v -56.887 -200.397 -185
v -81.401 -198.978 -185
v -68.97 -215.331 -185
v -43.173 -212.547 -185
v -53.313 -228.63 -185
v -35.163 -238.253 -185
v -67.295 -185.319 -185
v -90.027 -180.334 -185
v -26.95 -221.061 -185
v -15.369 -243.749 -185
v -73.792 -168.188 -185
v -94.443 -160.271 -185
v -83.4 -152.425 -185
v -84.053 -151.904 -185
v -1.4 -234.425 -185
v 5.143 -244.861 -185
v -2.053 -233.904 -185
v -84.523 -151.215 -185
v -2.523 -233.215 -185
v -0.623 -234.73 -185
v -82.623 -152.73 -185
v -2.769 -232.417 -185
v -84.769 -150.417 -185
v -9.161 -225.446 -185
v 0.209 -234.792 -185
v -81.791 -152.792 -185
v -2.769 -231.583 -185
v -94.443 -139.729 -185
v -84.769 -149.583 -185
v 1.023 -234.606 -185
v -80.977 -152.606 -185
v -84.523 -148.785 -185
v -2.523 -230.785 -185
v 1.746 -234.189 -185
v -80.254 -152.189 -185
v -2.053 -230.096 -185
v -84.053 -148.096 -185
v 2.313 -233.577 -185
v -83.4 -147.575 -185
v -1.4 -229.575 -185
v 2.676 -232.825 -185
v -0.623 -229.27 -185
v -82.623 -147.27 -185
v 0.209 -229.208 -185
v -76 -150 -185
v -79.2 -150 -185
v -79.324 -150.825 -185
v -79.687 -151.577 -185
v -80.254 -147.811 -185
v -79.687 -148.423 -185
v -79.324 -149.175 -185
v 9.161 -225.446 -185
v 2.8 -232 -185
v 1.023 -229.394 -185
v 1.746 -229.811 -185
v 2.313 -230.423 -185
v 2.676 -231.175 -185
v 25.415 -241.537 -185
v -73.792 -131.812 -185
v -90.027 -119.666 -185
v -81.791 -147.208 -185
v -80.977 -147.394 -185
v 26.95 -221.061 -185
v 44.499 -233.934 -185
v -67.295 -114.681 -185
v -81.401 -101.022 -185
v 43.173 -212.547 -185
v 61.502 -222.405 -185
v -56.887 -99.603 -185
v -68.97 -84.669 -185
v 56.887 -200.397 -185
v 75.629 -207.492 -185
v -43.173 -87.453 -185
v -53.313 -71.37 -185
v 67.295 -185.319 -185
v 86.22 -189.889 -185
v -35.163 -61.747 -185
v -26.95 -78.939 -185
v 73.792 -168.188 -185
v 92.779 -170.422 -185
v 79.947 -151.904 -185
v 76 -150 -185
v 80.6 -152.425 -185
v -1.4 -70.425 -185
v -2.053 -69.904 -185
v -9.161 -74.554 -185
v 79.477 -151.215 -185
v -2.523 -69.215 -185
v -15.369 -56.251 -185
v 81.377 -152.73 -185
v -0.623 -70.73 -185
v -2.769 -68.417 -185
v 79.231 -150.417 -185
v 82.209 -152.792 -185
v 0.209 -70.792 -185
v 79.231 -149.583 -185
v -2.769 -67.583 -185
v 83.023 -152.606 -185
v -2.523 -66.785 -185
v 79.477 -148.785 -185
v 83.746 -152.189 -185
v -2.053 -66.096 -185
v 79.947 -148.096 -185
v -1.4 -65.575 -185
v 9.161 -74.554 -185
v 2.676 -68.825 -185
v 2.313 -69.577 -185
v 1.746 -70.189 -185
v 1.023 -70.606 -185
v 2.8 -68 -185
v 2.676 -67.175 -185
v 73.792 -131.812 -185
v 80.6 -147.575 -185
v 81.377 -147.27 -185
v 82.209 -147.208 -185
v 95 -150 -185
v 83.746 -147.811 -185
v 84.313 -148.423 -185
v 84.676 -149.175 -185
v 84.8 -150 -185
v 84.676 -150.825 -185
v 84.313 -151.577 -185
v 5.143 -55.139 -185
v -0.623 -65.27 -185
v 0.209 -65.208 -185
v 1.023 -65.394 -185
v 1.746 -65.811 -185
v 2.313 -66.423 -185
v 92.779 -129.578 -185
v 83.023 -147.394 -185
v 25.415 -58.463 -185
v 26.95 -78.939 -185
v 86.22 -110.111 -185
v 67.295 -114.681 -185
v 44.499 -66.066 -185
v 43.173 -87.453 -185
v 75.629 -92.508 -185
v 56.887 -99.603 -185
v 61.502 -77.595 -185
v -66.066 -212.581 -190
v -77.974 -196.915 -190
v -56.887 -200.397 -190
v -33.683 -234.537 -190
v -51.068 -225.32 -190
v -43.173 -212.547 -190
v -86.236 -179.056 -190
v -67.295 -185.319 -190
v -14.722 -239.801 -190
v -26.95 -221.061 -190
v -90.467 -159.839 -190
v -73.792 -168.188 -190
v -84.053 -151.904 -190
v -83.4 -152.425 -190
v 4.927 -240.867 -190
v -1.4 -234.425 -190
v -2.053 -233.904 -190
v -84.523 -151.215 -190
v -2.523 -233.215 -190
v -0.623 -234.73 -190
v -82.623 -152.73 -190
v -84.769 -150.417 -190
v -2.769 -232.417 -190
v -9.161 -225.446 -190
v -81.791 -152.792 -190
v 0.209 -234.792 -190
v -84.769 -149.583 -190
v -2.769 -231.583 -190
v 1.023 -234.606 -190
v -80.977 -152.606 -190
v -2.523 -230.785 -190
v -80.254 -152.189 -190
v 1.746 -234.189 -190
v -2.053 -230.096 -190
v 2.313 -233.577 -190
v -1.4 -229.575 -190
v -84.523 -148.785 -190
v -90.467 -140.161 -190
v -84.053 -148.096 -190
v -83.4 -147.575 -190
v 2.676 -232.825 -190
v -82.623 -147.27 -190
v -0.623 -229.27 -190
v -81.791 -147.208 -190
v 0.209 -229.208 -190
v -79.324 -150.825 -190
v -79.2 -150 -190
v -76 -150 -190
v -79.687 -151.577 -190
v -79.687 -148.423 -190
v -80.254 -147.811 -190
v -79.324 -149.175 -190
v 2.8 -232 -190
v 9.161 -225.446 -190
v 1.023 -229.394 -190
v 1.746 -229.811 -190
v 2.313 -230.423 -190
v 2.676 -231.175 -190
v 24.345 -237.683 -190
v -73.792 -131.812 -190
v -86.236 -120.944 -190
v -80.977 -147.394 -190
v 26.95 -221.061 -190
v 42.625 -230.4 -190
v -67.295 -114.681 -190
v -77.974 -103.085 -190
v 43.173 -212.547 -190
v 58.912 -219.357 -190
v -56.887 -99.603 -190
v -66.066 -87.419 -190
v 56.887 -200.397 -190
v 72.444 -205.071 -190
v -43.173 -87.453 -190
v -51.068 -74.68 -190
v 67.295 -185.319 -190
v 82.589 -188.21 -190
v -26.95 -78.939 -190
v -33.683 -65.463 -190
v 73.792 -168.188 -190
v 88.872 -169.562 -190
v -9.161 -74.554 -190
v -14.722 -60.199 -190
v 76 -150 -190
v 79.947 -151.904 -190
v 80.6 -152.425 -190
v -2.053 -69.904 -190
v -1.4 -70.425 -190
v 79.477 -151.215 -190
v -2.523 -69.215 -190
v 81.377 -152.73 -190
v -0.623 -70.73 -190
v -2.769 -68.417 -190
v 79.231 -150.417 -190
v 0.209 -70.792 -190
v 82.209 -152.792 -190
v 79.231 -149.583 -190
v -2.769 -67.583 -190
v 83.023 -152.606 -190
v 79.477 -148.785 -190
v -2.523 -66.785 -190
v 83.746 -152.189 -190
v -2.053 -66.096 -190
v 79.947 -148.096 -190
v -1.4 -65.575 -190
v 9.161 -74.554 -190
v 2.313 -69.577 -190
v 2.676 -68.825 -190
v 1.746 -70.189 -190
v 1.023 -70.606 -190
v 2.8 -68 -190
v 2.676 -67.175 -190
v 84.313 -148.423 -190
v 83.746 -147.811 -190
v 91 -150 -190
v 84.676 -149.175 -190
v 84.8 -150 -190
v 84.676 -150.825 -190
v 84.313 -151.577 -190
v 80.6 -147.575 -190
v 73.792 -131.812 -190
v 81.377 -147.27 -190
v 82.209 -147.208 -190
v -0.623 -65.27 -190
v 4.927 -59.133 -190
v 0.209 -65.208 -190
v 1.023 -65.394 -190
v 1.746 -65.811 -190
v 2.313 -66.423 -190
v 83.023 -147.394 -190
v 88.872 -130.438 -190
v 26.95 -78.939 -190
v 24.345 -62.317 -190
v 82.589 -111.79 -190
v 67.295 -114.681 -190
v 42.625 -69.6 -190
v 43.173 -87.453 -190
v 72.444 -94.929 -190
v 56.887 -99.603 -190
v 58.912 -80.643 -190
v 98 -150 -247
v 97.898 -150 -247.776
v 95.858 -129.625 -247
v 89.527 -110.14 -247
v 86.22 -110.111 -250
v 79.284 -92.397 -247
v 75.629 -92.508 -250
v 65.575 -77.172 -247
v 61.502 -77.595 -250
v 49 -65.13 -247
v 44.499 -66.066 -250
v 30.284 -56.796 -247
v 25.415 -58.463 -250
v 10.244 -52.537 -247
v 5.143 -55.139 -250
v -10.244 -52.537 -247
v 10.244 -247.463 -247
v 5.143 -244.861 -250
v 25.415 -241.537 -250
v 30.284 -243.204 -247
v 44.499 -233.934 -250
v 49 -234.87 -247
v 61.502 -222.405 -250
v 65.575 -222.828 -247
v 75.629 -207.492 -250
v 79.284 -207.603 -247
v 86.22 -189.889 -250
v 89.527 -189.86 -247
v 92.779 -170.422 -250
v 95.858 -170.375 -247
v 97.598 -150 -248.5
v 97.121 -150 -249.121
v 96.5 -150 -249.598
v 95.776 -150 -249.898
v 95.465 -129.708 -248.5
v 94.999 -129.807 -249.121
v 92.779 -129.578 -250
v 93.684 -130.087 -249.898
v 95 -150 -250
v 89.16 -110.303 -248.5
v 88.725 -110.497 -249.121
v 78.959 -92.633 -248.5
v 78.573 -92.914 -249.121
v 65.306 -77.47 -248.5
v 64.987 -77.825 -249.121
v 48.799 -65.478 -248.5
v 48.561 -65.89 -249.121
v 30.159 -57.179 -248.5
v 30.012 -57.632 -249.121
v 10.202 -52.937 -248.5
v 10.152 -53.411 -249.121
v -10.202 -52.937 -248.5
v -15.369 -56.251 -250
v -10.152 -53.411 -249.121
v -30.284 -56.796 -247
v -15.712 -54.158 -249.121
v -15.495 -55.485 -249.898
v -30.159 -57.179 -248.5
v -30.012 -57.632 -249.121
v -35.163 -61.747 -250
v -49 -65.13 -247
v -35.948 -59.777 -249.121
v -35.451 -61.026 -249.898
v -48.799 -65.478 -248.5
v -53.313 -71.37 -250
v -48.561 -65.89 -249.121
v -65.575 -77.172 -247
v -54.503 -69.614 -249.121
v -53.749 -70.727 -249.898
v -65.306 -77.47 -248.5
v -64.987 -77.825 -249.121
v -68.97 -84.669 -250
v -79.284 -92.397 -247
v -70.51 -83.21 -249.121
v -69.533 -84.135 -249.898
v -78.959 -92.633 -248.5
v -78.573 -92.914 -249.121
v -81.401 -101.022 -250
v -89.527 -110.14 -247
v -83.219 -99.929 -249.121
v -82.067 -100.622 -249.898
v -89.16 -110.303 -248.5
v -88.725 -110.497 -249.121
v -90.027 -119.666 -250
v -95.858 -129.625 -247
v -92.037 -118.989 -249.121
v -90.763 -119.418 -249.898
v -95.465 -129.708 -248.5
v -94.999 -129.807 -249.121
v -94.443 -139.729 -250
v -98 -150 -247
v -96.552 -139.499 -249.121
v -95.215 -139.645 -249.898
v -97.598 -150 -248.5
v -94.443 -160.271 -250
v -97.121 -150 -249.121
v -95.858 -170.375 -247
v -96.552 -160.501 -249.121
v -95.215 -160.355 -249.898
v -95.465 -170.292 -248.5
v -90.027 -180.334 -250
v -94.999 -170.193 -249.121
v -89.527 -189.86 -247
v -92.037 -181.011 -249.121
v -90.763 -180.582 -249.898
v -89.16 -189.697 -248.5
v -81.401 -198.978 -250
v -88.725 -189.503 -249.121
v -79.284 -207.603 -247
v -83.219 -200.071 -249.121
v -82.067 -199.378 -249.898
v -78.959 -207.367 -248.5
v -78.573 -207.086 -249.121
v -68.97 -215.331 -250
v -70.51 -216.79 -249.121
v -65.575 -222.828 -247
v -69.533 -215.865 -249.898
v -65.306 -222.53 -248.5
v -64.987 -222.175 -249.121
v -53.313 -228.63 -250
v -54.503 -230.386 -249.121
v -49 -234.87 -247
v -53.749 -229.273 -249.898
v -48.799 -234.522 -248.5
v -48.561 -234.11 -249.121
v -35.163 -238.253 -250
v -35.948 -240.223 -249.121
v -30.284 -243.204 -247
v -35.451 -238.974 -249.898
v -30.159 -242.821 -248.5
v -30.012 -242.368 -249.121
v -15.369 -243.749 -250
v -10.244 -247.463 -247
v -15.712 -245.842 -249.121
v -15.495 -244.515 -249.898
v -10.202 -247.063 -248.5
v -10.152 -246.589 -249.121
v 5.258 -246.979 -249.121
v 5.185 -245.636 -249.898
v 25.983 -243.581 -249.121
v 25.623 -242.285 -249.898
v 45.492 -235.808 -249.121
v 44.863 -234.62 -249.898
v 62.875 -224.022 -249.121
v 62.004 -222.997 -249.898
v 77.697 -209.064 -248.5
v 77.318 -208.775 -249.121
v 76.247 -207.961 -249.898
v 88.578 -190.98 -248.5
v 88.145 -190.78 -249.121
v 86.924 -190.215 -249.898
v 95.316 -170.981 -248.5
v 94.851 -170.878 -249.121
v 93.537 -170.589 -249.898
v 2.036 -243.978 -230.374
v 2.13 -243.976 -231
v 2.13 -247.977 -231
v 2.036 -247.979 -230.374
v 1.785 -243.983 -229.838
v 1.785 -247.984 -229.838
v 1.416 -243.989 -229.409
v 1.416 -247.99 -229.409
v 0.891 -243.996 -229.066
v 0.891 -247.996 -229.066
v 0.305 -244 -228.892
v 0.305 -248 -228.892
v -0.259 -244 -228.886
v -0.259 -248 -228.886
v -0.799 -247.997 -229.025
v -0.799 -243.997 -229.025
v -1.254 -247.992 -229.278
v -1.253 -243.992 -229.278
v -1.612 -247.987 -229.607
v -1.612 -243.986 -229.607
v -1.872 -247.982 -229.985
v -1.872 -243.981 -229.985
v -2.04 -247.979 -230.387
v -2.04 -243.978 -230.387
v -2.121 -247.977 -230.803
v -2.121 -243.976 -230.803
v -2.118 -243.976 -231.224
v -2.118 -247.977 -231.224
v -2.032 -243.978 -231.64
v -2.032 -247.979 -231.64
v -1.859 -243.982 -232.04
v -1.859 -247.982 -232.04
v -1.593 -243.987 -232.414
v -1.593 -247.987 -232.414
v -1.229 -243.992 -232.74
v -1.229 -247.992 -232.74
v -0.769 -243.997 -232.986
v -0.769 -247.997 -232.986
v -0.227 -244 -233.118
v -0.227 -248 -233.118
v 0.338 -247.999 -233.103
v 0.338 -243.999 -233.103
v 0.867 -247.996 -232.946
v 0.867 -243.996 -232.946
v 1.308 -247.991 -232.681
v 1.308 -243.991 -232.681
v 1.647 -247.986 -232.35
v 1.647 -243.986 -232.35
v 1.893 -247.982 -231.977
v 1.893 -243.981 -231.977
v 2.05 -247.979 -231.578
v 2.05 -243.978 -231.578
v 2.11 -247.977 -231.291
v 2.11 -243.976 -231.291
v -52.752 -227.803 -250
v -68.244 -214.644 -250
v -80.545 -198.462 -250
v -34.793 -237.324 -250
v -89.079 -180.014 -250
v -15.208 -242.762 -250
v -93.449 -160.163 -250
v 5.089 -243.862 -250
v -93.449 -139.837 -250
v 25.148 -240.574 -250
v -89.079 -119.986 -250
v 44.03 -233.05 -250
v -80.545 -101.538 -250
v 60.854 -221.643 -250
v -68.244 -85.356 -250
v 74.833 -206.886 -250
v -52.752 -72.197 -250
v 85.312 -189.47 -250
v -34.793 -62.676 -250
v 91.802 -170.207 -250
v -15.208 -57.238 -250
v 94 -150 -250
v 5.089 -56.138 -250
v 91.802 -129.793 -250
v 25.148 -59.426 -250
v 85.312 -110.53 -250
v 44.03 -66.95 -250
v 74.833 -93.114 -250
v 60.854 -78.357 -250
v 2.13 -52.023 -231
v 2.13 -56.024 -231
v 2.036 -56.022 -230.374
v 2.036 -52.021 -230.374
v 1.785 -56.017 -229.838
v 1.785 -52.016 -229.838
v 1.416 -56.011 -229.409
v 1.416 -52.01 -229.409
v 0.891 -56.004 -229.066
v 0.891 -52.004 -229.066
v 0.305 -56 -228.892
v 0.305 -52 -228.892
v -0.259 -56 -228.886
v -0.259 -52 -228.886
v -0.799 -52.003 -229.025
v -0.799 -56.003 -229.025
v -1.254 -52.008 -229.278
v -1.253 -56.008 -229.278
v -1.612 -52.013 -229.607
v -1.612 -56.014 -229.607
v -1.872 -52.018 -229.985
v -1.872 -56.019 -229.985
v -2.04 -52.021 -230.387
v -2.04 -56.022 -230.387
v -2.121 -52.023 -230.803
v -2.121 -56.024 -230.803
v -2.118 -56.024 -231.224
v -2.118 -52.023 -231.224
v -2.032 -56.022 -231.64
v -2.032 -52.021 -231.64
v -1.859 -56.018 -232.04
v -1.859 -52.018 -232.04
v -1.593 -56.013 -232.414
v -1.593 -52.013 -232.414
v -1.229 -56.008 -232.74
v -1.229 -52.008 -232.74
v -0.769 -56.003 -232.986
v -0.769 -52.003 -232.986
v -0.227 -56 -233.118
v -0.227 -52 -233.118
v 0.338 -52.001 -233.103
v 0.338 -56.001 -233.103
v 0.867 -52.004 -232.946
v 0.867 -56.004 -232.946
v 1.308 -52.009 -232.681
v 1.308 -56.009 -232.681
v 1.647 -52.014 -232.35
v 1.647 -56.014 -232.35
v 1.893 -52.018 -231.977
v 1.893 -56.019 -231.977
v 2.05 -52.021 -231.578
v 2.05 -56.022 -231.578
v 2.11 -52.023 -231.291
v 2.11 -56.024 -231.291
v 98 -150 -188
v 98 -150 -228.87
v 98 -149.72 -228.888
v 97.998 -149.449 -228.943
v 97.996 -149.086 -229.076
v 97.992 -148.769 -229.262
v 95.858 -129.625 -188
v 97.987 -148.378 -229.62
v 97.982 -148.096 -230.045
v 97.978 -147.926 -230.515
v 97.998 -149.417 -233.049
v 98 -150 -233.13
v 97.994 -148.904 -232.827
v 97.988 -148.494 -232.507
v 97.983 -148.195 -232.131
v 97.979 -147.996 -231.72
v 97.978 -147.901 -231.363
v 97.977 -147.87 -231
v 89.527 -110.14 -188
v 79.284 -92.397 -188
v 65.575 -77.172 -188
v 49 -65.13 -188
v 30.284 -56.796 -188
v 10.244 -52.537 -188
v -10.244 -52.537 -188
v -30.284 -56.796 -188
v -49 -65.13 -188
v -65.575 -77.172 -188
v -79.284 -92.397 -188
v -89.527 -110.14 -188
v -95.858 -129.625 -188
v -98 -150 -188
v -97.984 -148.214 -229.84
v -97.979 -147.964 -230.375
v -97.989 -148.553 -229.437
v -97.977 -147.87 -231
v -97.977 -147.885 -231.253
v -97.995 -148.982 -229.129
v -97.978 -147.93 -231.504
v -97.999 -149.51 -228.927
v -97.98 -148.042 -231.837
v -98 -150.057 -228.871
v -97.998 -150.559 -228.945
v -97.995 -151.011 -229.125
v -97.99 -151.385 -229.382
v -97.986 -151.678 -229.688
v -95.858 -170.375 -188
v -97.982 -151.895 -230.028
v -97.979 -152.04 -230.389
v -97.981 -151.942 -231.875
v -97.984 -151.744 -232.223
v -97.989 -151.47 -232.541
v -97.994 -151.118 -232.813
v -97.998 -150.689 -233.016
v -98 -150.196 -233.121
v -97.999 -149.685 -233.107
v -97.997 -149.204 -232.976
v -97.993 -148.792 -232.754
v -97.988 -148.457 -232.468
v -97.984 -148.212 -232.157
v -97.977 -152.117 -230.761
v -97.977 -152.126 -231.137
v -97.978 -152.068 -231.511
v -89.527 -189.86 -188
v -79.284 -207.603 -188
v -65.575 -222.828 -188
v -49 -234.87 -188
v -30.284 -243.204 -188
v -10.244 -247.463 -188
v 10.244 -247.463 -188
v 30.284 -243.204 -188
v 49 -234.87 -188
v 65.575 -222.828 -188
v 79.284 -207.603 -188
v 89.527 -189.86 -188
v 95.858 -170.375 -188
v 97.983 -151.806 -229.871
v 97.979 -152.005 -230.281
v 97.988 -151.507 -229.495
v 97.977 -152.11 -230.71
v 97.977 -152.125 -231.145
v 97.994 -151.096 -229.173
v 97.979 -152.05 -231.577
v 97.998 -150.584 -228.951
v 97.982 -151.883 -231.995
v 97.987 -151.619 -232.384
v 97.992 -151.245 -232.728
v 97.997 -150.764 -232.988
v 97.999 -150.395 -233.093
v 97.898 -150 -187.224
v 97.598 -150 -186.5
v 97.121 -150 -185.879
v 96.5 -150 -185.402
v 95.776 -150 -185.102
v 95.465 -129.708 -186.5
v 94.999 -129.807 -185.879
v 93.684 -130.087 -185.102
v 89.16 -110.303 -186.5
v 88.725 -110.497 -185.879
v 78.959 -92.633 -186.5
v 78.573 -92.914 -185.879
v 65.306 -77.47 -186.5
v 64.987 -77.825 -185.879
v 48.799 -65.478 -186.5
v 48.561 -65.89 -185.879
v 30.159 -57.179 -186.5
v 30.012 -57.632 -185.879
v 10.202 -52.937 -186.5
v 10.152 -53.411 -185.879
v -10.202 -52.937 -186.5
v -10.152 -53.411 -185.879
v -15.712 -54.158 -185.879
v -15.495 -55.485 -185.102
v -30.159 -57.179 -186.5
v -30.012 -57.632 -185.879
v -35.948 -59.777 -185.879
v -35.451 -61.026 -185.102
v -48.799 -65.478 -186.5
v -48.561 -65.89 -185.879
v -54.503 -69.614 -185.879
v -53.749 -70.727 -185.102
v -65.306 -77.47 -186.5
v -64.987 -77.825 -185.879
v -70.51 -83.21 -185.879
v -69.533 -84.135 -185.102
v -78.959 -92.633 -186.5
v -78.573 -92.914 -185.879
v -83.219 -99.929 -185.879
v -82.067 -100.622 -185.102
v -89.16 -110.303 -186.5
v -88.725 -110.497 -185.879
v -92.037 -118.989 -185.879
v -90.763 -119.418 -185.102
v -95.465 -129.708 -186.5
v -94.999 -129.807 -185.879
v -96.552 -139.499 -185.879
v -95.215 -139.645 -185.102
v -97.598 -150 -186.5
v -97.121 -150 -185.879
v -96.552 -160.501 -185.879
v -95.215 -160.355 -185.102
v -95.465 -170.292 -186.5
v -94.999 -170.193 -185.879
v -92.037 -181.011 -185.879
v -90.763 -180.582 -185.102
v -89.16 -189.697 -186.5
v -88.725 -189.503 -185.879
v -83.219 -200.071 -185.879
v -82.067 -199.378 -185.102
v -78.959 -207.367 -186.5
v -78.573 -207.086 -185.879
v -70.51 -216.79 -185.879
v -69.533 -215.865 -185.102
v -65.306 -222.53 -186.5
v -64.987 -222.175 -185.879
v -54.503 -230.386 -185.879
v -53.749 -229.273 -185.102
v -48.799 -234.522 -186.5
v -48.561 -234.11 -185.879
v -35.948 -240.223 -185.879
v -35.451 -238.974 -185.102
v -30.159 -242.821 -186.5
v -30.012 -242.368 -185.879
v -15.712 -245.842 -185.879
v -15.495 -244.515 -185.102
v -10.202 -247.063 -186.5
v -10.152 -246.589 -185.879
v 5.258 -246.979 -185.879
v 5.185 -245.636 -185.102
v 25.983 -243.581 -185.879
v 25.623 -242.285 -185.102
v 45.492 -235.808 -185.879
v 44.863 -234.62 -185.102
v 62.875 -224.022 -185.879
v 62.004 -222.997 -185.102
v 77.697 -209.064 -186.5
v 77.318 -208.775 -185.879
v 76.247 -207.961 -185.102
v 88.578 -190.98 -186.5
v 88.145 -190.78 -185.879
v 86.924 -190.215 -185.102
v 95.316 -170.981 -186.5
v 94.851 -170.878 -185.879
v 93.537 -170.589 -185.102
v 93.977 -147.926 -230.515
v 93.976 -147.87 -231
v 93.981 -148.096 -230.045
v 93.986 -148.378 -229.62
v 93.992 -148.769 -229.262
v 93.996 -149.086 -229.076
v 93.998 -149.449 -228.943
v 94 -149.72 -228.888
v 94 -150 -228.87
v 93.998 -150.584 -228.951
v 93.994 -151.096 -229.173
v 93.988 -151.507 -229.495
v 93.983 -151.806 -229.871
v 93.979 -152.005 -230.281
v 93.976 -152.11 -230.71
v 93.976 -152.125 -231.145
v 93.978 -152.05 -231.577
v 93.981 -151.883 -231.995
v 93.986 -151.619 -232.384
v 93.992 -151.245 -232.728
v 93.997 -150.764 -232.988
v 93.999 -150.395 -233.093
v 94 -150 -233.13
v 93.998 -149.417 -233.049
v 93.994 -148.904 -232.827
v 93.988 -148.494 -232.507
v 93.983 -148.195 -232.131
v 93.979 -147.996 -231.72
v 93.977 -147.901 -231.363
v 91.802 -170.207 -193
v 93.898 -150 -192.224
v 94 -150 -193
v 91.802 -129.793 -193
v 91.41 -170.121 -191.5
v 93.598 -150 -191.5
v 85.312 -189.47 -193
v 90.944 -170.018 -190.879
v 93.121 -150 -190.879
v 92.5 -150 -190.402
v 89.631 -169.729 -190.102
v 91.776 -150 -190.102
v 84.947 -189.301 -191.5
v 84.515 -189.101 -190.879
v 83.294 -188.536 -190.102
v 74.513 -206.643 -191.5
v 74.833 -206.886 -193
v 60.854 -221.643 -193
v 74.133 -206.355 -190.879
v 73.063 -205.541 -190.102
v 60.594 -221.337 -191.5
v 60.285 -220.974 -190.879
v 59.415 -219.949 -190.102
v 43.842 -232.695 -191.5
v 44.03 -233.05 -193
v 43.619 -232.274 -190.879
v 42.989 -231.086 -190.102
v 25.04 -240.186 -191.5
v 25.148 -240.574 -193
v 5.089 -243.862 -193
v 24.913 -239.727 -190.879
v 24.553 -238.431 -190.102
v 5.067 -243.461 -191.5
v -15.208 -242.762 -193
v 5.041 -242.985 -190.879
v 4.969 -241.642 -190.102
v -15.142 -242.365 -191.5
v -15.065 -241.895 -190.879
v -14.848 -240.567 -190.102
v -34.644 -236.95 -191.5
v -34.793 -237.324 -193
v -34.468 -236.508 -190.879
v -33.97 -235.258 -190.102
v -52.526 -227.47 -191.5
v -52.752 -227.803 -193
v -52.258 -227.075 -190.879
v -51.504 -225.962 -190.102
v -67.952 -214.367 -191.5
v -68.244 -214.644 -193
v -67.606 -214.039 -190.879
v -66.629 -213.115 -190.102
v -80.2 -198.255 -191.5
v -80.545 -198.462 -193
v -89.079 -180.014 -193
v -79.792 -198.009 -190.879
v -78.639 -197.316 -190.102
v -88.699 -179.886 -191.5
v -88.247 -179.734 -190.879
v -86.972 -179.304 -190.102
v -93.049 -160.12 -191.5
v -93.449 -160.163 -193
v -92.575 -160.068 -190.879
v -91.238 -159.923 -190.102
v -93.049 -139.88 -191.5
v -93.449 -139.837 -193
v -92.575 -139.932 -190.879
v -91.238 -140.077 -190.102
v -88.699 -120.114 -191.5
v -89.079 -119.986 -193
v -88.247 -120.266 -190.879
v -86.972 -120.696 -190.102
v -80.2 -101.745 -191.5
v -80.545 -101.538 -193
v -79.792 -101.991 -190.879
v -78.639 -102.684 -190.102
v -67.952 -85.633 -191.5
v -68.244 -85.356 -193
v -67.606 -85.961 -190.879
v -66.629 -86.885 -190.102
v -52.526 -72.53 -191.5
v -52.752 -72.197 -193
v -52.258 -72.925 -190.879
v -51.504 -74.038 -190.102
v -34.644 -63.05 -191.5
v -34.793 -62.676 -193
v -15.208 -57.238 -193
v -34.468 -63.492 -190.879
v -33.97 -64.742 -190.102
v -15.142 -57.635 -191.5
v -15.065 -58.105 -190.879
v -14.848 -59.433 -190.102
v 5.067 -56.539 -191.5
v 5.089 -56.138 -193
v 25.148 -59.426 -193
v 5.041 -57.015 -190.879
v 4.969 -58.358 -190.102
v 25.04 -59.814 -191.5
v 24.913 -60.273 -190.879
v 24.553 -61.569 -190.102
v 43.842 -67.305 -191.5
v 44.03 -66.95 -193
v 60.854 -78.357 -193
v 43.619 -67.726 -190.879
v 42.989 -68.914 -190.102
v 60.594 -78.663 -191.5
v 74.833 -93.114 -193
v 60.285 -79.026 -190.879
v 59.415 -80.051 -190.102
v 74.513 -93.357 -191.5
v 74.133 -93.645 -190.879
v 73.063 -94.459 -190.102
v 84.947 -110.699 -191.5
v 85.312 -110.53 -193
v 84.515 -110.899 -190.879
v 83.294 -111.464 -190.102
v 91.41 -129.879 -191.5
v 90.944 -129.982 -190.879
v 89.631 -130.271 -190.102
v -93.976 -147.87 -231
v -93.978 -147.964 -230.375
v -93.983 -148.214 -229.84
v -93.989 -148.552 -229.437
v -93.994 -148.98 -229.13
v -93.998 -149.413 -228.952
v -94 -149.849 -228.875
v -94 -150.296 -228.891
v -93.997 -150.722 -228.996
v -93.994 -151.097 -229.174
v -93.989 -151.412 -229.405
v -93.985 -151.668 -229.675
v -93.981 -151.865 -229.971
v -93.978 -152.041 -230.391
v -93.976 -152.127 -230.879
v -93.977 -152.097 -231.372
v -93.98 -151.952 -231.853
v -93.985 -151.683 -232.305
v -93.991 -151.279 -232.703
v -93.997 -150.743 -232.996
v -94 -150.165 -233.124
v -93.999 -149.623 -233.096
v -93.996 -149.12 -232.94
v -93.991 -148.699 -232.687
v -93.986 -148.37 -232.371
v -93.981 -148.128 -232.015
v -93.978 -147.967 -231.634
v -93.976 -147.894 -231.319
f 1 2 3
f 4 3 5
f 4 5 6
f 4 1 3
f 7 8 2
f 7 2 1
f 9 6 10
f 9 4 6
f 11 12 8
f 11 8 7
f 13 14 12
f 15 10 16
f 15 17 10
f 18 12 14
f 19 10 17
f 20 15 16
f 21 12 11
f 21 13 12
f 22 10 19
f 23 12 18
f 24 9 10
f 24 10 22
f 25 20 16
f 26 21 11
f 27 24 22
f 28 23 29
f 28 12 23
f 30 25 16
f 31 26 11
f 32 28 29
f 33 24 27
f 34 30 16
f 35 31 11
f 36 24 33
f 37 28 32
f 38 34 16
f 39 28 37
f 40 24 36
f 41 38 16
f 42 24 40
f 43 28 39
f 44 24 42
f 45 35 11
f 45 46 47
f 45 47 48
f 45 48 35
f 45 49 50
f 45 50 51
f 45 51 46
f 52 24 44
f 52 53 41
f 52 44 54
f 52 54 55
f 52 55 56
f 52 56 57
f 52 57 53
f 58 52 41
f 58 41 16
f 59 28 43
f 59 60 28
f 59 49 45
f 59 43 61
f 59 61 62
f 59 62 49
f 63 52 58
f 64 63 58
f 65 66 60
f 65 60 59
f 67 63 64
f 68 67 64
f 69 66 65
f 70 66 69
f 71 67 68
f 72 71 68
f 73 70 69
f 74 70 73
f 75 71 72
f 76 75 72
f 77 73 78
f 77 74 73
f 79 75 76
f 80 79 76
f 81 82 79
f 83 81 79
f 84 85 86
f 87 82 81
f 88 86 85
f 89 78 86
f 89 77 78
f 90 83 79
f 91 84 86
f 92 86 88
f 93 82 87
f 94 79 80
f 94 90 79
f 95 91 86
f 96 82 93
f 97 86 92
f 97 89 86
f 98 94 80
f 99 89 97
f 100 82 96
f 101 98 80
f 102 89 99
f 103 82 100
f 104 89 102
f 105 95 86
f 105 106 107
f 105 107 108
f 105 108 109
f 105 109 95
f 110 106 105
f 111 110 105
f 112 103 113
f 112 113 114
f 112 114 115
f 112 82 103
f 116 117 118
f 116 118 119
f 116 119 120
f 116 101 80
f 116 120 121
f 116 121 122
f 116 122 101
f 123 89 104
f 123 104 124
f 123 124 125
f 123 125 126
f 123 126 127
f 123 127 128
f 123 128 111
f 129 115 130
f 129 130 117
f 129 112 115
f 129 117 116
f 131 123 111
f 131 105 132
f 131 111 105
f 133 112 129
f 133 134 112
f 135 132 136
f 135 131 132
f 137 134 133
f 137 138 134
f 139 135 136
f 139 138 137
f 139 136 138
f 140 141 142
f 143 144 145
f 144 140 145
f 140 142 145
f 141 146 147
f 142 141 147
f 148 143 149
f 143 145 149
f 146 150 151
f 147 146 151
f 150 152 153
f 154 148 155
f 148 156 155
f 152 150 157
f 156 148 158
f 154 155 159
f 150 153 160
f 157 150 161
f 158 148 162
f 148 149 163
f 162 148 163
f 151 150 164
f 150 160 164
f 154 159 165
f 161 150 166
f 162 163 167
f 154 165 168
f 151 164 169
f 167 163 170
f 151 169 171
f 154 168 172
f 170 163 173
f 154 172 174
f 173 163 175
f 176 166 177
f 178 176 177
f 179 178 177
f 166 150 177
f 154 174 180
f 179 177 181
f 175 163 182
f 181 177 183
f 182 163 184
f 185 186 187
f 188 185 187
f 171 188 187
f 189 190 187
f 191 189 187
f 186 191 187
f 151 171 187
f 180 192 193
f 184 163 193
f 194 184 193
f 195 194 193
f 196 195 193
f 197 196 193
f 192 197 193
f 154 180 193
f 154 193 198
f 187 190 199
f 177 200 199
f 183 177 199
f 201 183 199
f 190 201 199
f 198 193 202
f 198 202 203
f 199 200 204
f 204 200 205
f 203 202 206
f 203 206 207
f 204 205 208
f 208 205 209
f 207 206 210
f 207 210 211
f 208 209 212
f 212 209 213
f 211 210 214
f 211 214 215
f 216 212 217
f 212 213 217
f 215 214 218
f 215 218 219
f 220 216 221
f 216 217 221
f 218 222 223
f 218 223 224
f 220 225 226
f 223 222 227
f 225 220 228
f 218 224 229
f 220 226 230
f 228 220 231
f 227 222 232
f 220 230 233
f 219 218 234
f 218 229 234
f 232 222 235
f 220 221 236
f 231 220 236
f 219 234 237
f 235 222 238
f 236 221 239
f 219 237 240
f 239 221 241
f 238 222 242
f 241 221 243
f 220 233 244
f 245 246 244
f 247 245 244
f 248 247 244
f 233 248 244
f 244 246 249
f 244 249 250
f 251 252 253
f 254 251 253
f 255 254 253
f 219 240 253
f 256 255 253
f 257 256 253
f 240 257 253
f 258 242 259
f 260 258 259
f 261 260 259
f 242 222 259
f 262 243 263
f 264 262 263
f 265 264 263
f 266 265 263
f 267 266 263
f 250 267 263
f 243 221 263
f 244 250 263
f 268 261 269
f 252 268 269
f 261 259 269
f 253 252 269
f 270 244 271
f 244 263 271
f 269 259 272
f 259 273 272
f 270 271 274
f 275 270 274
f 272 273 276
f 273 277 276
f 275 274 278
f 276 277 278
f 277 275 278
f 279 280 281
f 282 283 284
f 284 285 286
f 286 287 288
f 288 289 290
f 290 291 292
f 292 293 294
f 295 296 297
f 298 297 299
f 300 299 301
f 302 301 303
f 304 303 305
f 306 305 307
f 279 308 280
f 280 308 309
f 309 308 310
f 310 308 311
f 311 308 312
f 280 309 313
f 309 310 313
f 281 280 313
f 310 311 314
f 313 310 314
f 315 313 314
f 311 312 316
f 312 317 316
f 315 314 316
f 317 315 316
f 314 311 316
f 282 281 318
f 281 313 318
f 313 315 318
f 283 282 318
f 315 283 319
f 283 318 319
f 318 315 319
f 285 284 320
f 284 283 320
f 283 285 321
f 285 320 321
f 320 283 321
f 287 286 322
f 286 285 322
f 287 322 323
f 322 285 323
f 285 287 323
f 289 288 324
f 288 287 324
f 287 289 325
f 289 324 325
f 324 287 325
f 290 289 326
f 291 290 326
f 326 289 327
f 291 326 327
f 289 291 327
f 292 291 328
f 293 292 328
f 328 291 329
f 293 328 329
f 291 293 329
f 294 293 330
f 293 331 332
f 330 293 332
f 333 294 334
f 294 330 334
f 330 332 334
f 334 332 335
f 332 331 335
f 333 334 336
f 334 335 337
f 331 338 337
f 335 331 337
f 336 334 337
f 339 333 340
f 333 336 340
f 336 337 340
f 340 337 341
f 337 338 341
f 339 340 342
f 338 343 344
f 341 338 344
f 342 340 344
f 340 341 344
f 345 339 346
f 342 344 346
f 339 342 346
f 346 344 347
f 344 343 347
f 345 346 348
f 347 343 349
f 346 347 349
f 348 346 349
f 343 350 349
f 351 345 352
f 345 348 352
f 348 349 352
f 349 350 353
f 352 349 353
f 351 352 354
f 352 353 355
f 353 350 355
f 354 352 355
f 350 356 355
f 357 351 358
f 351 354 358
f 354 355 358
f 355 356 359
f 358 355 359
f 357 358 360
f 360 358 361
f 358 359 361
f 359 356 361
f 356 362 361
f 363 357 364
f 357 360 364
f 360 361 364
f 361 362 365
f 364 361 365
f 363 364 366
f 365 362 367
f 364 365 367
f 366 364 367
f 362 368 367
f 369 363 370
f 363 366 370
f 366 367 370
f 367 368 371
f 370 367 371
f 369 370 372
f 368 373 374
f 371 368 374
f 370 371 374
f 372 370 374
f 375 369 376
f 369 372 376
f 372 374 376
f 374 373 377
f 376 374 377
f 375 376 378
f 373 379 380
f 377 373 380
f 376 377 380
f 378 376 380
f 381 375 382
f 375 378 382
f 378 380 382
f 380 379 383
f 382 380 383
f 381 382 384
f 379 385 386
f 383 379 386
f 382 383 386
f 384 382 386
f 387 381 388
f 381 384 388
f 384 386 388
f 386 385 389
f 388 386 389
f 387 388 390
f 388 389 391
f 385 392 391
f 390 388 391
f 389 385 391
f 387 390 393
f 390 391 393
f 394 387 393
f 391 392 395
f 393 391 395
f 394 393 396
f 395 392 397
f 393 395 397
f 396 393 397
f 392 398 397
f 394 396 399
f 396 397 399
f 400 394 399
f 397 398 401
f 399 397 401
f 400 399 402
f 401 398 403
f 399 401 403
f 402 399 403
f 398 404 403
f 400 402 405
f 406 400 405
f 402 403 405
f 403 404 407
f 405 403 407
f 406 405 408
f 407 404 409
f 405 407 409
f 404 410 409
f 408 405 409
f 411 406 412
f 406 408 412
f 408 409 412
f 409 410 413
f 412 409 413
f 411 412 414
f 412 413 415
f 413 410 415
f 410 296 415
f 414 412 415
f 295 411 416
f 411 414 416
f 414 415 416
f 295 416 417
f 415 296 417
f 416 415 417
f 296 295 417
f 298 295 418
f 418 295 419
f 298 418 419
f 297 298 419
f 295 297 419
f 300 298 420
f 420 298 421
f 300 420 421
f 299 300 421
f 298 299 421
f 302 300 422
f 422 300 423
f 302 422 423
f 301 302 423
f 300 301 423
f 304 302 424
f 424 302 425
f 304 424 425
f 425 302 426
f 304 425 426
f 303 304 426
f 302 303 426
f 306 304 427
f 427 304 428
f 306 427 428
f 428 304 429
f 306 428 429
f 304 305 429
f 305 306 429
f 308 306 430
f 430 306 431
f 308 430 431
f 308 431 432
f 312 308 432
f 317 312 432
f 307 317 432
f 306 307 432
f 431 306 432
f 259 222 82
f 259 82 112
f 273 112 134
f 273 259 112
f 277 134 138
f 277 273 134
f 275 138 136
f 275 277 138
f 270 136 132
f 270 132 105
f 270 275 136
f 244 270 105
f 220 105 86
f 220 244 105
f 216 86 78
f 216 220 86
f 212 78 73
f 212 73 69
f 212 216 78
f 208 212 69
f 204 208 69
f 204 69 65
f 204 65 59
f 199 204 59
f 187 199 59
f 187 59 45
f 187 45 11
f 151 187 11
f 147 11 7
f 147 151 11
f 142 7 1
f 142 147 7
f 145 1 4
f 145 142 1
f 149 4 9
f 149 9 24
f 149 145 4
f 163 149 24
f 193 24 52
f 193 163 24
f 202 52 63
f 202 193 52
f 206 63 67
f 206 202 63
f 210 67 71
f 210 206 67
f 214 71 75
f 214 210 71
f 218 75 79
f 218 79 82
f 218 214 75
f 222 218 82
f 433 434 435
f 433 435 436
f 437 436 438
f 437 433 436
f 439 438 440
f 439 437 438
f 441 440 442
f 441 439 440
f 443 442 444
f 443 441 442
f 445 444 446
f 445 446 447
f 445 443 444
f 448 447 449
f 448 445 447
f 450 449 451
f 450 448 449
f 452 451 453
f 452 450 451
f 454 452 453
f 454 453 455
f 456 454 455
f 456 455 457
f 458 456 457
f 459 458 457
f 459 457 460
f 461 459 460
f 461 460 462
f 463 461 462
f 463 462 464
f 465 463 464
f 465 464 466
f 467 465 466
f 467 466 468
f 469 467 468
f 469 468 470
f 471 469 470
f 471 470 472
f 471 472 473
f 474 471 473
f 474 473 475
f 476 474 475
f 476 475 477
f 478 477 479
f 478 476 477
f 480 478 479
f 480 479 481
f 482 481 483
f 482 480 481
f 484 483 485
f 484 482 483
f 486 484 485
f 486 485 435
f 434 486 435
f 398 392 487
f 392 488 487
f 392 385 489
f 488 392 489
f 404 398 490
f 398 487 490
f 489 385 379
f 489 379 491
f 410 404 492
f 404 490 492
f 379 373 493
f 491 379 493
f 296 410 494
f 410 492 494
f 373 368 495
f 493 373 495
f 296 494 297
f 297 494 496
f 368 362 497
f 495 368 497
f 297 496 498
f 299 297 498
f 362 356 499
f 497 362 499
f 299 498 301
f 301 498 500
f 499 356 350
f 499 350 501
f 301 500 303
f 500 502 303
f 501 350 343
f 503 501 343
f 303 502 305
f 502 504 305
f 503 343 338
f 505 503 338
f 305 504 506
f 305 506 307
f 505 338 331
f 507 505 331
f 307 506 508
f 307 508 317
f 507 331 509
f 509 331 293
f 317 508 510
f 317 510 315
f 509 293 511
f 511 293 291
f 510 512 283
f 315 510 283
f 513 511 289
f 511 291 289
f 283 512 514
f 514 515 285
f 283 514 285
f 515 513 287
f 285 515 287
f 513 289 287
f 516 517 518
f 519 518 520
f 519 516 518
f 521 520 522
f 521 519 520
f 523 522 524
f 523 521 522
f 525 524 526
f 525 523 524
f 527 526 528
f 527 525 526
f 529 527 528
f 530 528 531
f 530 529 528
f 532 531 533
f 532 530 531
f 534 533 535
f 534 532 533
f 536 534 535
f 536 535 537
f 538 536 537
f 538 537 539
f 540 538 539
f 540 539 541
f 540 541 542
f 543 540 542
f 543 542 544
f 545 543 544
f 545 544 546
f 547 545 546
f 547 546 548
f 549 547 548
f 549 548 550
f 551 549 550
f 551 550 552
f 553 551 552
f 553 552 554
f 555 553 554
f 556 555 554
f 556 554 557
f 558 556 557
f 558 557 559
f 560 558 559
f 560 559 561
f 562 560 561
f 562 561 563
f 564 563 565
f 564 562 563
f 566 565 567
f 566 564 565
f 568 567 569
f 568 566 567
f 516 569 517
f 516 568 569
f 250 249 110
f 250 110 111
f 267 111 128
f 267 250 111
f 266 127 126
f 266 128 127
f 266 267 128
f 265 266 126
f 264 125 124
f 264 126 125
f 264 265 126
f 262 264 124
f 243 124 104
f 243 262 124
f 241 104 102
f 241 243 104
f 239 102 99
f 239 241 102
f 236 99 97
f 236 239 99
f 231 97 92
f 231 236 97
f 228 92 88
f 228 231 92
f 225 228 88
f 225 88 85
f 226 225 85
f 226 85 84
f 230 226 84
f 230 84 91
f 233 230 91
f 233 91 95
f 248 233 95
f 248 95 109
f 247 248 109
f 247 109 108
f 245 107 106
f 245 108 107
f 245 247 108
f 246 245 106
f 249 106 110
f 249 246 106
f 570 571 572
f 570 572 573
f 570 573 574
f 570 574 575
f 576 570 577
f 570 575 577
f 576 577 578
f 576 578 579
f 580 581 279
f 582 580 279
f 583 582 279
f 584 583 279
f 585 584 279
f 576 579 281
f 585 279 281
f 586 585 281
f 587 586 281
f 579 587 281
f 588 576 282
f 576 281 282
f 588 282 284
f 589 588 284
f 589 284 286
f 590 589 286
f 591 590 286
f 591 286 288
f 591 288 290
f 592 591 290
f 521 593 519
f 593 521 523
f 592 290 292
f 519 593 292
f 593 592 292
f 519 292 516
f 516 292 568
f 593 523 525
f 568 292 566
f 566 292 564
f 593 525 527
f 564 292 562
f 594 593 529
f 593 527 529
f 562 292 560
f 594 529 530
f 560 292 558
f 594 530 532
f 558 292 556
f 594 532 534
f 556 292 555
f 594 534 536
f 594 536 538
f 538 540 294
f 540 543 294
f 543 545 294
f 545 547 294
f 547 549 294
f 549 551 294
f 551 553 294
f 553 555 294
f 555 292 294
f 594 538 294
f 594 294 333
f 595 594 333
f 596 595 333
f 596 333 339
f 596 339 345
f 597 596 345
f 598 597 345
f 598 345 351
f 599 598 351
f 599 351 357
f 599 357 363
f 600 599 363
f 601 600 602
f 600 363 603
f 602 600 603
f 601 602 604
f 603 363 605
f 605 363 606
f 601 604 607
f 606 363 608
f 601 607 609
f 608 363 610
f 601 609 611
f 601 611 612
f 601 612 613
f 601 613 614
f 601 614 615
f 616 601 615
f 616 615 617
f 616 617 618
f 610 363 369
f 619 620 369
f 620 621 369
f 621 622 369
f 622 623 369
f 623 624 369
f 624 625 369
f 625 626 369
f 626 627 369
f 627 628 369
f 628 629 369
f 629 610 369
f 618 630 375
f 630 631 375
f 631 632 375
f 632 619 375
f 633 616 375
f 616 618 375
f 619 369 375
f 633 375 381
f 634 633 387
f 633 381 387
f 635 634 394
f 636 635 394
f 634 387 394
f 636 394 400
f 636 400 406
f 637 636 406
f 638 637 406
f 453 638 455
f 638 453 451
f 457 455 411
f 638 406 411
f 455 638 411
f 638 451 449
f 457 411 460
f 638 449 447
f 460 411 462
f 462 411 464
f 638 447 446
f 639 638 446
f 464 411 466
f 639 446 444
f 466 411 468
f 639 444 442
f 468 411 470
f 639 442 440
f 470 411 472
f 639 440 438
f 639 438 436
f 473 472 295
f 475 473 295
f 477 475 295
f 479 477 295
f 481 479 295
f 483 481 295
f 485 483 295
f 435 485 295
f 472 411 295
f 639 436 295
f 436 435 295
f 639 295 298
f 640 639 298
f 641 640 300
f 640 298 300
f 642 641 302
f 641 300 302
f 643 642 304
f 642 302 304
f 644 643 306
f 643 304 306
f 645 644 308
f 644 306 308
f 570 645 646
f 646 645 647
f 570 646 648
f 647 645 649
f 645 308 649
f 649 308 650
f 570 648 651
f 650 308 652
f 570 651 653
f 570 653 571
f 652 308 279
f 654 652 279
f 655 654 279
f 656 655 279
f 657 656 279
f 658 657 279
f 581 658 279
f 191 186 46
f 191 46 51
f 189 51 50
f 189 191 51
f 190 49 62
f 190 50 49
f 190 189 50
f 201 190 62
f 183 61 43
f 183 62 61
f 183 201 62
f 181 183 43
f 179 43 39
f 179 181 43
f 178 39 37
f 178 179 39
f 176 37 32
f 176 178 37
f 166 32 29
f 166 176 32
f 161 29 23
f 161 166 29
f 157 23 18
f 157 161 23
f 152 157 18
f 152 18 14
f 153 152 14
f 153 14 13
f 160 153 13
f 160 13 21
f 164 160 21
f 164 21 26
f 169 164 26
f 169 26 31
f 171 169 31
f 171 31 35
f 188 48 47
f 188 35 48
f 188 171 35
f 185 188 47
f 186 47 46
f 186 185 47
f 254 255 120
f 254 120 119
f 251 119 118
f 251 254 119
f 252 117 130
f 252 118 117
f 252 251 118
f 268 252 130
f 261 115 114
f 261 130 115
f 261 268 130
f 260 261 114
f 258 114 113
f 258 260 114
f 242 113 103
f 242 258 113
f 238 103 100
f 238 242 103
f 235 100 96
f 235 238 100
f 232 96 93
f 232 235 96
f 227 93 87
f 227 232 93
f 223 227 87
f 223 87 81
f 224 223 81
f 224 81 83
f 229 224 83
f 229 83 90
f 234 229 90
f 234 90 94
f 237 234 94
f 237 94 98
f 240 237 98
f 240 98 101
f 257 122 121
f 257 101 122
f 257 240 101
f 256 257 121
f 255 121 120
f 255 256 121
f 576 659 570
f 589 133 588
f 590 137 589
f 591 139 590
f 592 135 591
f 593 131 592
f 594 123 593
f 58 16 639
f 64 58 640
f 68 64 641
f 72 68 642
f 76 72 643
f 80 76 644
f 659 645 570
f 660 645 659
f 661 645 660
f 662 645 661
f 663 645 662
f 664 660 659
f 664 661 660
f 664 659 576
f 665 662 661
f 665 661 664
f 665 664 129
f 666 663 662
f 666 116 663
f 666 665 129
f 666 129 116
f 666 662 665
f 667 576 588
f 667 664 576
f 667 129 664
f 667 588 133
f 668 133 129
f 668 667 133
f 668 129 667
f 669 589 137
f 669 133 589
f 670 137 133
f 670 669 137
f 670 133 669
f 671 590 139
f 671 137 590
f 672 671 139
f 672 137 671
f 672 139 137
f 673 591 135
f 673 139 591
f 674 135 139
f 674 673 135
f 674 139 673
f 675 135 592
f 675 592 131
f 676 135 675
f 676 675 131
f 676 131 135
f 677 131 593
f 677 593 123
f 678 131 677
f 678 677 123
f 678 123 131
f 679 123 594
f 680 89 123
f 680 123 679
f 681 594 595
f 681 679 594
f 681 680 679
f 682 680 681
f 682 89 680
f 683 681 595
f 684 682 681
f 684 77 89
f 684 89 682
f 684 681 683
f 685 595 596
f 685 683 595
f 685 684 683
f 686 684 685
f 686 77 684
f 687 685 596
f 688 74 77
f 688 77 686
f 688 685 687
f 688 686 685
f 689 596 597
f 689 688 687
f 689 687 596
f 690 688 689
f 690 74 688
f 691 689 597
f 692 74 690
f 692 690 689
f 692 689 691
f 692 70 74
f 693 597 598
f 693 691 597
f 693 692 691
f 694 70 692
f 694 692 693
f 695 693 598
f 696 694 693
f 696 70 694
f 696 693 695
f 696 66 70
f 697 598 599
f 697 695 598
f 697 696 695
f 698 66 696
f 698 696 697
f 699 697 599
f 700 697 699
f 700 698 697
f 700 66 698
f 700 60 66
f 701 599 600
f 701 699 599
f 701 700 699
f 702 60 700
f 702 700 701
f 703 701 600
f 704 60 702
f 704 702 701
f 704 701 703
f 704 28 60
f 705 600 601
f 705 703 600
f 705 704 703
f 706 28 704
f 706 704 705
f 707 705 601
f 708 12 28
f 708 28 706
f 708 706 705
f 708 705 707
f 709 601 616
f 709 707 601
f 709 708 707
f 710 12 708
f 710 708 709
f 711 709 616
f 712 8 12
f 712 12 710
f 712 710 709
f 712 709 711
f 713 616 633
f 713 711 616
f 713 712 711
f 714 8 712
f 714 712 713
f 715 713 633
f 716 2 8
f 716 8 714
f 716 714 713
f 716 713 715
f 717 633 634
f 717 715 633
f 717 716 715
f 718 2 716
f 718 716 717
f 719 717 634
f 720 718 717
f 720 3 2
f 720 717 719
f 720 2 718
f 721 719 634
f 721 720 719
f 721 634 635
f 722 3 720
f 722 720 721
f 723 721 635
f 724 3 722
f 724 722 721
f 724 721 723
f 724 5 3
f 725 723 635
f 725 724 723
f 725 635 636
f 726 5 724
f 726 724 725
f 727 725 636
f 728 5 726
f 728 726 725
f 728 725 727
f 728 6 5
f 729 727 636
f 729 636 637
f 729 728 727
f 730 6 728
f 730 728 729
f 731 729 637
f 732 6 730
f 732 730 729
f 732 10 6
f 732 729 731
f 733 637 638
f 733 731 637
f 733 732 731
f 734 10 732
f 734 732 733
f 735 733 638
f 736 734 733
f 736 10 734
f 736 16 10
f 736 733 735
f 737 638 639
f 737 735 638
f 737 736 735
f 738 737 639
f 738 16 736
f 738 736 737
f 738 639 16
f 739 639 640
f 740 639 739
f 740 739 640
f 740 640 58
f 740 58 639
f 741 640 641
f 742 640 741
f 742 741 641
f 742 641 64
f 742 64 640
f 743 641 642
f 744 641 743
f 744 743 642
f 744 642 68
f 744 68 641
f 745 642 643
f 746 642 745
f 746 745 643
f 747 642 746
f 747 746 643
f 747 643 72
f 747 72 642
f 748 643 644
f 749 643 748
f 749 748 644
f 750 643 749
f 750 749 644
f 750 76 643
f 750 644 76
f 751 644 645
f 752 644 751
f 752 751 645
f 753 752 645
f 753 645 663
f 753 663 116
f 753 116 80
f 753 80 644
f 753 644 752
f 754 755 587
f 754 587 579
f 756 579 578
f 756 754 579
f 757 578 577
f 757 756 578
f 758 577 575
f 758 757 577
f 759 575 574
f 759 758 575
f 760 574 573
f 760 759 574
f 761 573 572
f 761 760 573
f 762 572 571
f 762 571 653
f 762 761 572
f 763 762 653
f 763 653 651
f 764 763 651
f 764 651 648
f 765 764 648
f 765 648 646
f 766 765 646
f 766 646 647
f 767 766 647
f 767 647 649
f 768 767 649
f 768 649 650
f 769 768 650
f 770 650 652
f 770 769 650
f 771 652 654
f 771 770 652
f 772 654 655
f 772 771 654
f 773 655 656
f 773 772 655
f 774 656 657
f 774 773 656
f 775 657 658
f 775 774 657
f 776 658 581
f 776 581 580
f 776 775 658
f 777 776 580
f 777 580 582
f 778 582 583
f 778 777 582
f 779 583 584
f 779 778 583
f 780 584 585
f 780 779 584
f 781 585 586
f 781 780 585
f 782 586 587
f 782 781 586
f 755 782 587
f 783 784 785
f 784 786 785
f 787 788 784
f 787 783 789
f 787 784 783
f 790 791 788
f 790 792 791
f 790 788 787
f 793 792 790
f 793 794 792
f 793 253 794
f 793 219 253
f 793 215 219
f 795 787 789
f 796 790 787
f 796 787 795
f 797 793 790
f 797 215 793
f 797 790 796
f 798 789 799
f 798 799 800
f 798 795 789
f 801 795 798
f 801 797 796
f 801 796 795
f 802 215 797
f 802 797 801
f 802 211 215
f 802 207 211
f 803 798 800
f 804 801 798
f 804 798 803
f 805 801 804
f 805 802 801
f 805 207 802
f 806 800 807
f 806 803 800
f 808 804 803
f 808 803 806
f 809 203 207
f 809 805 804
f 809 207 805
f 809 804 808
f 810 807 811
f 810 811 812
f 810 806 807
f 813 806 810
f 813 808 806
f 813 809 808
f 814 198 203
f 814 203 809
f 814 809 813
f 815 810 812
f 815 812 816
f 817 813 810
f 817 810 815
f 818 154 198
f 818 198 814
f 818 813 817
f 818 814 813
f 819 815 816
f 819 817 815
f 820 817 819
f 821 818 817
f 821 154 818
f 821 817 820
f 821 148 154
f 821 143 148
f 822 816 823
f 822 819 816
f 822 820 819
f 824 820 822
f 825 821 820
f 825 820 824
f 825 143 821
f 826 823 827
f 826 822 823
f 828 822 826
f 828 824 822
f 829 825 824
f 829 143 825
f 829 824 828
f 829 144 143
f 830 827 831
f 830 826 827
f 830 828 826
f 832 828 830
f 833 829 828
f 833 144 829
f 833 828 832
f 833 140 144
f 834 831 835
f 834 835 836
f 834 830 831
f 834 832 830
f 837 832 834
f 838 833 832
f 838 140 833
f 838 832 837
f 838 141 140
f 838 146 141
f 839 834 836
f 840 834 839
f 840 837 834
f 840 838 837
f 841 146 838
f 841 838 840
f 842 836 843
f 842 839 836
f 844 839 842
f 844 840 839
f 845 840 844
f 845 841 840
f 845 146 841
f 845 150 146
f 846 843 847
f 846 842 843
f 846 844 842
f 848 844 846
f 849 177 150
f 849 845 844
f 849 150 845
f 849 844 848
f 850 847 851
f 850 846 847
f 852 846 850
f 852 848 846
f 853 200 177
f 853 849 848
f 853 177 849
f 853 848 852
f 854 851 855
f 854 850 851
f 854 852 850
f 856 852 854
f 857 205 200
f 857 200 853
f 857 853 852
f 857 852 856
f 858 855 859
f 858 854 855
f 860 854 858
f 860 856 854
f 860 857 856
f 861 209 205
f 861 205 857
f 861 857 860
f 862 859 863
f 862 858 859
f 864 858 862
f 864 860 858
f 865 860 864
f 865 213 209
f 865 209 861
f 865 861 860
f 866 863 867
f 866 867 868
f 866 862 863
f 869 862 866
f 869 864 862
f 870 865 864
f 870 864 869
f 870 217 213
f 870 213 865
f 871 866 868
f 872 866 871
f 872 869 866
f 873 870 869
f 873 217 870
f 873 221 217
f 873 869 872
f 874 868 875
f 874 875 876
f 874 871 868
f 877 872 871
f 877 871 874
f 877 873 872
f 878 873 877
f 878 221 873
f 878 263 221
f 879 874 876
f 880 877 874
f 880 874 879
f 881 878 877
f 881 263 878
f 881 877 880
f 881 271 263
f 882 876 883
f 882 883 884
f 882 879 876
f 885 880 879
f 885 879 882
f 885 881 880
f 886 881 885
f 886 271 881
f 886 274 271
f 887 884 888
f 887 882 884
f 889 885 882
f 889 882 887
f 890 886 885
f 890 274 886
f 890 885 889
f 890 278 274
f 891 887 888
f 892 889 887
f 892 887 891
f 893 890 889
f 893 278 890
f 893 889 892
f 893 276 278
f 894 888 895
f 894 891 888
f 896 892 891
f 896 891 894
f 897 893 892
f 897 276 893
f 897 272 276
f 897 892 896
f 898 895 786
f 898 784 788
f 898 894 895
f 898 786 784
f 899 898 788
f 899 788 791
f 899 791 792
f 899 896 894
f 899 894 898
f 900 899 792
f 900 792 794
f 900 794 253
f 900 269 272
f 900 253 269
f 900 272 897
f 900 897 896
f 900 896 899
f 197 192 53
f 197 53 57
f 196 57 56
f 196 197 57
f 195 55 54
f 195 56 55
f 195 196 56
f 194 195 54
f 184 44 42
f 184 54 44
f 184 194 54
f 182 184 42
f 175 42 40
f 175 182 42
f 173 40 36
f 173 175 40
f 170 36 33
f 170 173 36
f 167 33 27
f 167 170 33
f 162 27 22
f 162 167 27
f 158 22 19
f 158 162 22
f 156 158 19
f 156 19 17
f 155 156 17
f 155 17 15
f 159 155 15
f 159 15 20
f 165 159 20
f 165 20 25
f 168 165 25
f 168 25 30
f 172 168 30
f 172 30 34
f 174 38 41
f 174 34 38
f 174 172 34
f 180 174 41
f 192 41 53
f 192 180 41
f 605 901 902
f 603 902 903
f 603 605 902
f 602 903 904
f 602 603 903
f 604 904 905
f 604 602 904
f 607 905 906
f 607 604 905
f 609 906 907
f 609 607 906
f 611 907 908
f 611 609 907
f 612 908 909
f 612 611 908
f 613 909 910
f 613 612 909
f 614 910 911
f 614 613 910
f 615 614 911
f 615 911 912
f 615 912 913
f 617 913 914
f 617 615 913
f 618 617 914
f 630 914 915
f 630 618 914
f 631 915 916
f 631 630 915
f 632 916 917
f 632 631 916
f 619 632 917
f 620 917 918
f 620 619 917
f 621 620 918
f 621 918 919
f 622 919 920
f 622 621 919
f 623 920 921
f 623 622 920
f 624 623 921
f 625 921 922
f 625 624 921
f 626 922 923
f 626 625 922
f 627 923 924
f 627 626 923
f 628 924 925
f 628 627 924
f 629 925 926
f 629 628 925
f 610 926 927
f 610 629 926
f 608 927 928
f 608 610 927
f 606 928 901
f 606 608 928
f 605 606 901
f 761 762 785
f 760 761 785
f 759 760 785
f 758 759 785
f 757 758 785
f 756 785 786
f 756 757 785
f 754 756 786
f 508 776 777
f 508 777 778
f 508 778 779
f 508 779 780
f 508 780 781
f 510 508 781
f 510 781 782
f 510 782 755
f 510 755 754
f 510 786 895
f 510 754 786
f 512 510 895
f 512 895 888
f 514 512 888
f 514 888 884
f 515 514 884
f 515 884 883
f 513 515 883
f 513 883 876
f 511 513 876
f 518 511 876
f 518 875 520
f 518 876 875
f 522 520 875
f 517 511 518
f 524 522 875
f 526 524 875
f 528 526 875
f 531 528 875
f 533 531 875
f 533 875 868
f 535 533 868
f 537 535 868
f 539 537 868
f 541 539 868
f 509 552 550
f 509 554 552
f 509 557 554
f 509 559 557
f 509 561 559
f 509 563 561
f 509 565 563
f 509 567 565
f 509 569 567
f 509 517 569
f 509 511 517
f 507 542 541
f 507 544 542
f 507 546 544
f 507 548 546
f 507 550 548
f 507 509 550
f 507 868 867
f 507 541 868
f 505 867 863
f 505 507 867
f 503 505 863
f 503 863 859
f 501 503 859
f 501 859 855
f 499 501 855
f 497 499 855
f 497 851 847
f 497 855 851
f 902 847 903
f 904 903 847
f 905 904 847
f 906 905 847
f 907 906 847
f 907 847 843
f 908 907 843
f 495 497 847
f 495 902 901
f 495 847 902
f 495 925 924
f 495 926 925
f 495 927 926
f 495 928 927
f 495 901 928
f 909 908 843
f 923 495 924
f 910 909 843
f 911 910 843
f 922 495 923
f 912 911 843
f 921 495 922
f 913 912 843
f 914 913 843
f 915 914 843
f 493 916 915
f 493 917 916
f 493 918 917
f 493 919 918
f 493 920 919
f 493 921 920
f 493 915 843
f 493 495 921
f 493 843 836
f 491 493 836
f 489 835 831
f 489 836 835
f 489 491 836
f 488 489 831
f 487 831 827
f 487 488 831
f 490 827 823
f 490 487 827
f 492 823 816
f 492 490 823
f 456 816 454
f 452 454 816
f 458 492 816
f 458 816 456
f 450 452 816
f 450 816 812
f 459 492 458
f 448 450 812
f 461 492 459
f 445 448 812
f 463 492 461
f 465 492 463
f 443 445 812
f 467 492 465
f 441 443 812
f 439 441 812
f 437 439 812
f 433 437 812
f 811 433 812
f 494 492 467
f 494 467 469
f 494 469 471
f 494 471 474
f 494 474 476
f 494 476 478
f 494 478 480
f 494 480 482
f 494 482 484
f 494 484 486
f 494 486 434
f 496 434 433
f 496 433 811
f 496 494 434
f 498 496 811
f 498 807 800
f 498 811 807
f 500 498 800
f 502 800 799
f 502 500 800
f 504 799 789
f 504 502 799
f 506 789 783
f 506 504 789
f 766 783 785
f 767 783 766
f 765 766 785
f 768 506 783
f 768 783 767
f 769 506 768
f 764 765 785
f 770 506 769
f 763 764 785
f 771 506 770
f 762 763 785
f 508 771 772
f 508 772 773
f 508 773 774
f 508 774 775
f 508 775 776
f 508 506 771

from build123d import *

# Parameters (mm, degrees)
SKETCH044_R       = 2.8
EXTRUDE026_DEPTH  = 20
CYLINDER131_R     = 2.13
CYLINDER131_DEPTH = 300
CYLINDER132_R     = 2.13
CYLINDER132_DEPTH = 300
TUBE004_R         = 98
TUBE004_R_2       = 94
TUBE004_DEPTH     = 65
SKETCH042_R       = 98
SKETCH042_R_2     = 76
EXTRUDE024_DEPTH  = 5
FILLET002_R       = 3


with BuildPart() as m4heatsetvercuts001:
    # Sketch044 → Extrude026 (new body)
    with BuildSketch(Plane.XY):
        with Locations((0, -68)):
            Circle(SKETCH044_R)
        with Locations((82, -150)):
            Circle(SKETCH044_R)
        with Locations((0, -232)):
            Circle(SKETCH044_R)
        with Locations((-82, -150)):
            Circle(SKETCH044_R)
    extrude(amount=EXTRUDE026_DEPTH)


with BuildPart() as m4heatsetvercuts001_1:
    # Extrude026 placement: moved
    add(m4heatsetvercuts001.part.moved(Location((0, 0, -193))))


with BuildPart() as cylinder131:
    # Cylinder131 → Cylinder131 (new body)
    with BuildSketch(Plane(origin=(0, 0, 90), x_dir=(1, 0, 0), z_dir=(0, -1, 0))):
        Circle(CYLINDER131_R)
    extrude(amount=CYLINDER131_DEPTH)


with BuildPart() as m4cuts009:
    # Cylinder132 → Cylinder132 (new body)
    with BuildSketch(Plane(origin=(-150, -150, 90), x_dir=(0, 1, 0), z_dir=(1, 0, 0))):
        Circle(CYLINDER132_R)
    extrude(amount=CYLINDER132_DEPTH)

    # Fusion084: union Cylinder131
    add(cylinder131.part)


with BuildPart() as m4cuts009_1:
    # Fusion084 placement: moved
    add(m4cuts009.part.moved(Location((0, 0, -321))))


with BuildPart() as tube004:
    # Tube004 → Tube004 (new body)
    with BuildSketch(Plane(origin=(0, -150, -125), x_dir=(1, 0, 0), z_dir=(0, 0, 1))):
        Circle(TUBE004_R)
        Circle(TUBE004_R_2, mode=Mode.SUBTRACT)
    extrude(amount=TUBE004_DEPTH)


with BuildPart() as level5s001:
    # Sketch042 → Extrude024 (new body)
    with BuildSketch(Plane.XY):
        with Locations((0, -150)):
            Circle(SKETCH042_R)
        with Locations((0, -150)):
            Circle(SKETCH042_R_2, mode=Mode.SUBTRACT)
    extrude(amount=EXTRUDE024_DEPTH)


with BuildPart() as level5s001_1:
    # Extrude024 placement: moved
    add(level5s001.part.moved(Location((0, 0, -65))))

    # Fusion082: union Tube004
    add(tube004.part)


with BuildPart() as level5s001_2:
    # Fusion082 placement: moved
    add(level5s001_1.part.moved(Location((0, 0, -125))))

    # Cut036: cut m4Cuts009
    add(m4cuts009_1.part, mode=Mode.SUBTRACT)

    # Cut038: cut m4HeatSetVerCuts001
    add(m4heatsetvercuts001_1.part, mode=Mode.SUBTRACT)

    # Fillet002
    fillet002_edges = [level5s001_2.edges().sort_by_distance(p)[0] for p in [
        (-98, -150, -185),
        (-98, -150, -250),
        (-94, -150, -190),
    ]]
    fillet(fillet002_edges, radius=FILLET002_R)


solid = level5s001_2.part
